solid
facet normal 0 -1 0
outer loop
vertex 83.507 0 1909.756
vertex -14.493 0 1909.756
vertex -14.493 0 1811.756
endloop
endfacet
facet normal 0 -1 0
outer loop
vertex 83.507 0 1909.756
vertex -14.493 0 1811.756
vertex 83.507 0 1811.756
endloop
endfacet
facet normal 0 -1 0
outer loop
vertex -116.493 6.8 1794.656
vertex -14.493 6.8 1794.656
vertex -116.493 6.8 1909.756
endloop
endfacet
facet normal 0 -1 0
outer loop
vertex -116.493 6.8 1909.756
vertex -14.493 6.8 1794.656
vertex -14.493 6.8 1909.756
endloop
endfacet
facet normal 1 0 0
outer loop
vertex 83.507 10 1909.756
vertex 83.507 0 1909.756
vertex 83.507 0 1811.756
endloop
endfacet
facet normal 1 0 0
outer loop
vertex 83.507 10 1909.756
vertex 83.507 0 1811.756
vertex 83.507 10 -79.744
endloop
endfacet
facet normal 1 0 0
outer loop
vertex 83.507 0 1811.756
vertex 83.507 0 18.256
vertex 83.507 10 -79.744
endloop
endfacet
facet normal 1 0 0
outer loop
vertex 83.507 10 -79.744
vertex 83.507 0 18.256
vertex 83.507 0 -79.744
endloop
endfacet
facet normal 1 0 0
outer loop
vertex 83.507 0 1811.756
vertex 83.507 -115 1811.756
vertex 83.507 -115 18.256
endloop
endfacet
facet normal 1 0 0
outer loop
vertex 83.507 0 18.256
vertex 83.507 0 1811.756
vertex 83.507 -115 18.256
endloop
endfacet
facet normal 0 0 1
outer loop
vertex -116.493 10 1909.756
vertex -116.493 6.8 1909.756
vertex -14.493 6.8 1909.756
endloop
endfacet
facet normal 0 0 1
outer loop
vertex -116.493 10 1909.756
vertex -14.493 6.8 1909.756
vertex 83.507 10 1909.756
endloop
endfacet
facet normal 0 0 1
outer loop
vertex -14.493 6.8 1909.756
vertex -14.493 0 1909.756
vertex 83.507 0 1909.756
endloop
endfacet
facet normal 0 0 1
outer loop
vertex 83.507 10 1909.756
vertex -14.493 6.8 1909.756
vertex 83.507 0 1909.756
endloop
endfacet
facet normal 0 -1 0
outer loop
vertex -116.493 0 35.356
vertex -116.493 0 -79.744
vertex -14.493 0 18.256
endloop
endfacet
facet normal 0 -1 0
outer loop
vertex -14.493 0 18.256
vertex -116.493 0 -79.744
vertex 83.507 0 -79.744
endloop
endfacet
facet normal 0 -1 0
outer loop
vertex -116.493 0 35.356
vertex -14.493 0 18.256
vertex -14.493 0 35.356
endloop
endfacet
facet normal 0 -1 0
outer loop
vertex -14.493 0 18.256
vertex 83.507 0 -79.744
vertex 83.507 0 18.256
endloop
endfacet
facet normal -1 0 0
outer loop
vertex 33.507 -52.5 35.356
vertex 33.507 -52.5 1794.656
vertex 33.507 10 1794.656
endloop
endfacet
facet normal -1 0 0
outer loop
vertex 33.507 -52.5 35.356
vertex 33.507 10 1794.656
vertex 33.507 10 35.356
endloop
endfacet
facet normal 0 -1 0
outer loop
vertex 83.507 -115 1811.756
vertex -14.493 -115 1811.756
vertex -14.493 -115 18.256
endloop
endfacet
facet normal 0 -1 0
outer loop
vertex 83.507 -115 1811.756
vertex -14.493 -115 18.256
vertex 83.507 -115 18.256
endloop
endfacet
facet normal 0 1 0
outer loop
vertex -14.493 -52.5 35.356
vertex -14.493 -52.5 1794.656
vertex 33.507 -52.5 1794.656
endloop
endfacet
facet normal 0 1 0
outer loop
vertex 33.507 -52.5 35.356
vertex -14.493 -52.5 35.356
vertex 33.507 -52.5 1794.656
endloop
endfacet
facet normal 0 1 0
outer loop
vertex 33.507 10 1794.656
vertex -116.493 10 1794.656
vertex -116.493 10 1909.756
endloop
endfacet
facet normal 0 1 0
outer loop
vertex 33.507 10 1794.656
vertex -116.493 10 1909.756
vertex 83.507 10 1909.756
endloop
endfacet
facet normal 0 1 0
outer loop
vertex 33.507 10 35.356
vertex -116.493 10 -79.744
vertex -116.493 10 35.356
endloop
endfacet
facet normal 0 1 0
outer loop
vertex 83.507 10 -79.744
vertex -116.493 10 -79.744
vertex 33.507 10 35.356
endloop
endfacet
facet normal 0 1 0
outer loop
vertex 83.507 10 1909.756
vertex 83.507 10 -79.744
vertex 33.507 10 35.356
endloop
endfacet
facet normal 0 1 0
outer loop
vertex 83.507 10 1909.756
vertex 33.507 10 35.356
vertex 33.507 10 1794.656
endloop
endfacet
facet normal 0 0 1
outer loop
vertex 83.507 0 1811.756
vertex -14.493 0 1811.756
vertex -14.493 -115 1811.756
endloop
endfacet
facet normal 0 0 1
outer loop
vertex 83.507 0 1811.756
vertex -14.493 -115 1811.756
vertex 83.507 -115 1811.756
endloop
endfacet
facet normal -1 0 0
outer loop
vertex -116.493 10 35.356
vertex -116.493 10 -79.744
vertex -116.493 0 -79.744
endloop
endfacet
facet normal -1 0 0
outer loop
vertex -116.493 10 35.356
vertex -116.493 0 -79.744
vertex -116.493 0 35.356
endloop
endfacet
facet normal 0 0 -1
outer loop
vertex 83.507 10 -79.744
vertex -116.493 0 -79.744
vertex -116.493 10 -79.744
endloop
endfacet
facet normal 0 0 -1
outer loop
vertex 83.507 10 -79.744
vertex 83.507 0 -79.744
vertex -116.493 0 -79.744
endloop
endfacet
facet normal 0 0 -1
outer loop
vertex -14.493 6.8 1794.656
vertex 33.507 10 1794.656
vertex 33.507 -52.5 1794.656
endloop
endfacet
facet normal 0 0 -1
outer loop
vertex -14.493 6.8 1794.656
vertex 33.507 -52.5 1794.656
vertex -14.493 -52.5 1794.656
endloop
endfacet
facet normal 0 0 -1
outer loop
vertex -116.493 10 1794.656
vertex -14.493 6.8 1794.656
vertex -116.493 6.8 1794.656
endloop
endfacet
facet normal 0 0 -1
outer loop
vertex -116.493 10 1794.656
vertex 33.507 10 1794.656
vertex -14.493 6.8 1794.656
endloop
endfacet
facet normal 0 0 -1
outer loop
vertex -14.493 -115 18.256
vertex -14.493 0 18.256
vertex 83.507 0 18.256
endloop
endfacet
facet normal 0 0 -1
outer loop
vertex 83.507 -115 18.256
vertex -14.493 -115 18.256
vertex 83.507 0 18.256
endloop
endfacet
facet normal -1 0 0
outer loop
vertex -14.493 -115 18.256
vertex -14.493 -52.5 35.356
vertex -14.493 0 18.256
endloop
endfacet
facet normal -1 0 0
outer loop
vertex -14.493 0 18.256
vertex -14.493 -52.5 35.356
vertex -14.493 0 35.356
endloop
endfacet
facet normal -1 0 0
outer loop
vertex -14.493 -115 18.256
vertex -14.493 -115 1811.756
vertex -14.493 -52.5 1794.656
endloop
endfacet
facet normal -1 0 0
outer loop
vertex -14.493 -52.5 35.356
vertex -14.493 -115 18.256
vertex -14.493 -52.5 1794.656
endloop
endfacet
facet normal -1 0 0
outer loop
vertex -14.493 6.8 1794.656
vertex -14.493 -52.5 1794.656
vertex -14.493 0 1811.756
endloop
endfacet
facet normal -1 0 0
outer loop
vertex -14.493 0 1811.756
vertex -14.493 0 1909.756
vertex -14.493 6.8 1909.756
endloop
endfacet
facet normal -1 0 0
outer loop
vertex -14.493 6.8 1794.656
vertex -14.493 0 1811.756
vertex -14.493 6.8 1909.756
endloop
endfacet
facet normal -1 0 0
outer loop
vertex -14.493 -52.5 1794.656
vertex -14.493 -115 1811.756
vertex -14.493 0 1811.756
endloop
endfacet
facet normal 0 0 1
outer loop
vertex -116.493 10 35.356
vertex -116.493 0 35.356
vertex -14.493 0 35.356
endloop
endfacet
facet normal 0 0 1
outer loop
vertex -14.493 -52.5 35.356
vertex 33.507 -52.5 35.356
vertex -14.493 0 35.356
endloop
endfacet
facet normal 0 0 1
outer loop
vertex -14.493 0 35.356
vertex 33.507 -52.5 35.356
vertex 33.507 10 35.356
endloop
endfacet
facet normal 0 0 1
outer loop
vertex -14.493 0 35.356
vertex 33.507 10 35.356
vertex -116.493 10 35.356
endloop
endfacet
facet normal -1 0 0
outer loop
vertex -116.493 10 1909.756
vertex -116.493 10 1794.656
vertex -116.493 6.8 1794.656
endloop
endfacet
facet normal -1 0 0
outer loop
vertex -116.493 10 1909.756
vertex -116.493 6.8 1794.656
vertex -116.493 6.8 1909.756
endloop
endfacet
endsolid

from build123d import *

# Parameters (mm, degrees)
SKETCH_2_W      = 98
SKETCH_2_H      = 98
EXTRUDE_1_DEPTH = 10
SKETCH_3_W      = 98
SKETCH_3_H      = 125
EXTRUDE_2_DEPTH = 10
SKETCH_4_W      = 98
SKETCH_4_H      = 62.5
EXTRUDE_3_DEPTH = 886.75
SKETCH_5_W      = 98
SKETCH_5_H      = 62.5
EXTRUDE_4_DEPTH = 7.1
SKETCH_6_W      = 98
SKETCH_6_H      = 62.5
EXTRUDE_5_DEPTH = 7.1
SKETCH_9_W      = 115.1
SKETCH_9_H      = 10
SKETCH_9_H_2    = 3.2
EXTRUDE_6_DEPTH = 102
SKETCH_11_W     = 50
SKETCH_11_H     = 1759.3
EXTRUDE_7_DEPTH = 62.5


with BuildPart() as part:
    # 草图2 → 凸台-拉伸1 (new body)
    with BuildSketch(Plane(origin=(0, 0, 0), x_dir=(1, 0, 0), z_dir=(0, 1, 0))):
        with Locations((34.507061985, 30.744472309)):
            Rectangle(SKETCH_2_W, SKETCH_2_H)
    extrude(amount=EXTRUDE_1_DEPTH)

    # 草图3 → 凸台-拉伸2 (add)
    with BuildSketch(Plane.XY.offset(18.255527691)):
        with Locations((34.507061985, -52.5)):
            Rectangle(SKETCH_3_W, SKETCH_3_H)
    extrude(amount=EXTRUDE_2_DEPTH)

    # 草图4 → 凸台-拉伸3 (add)
    with BuildSketch(Plane.XY.offset(28.255527691)):
        with Locations((34.507061985, -83.75)):
            Rectangle(SKETCH_4_W, SKETCH_4_H)
    extrude(amount=EXTRUDE_3_DEPTH)

    # 镜向4: part across plane


with BuildPart() as part_1:
    add(part.part)
    add(part.part.mirror(Plane.XY.offset(915.005527691)))

    # 草图5 → 凸台-拉伸4 (add)
    with BuildSketch(Plane.XY.offset(28.255527691)):
        with Locations((34.507061985, -21.25)):
            Rectangle(SKETCH_5_W, SKETCH_5_H)
    extrude(amount=EXTRUDE_4_DEPTH)

    # 草图6 → 凸台-拉伸5 (add)
    with BuildSketch(Plane(origin=(0, 0, 1801.755527691), x_dir=(-1, 0, 0), z_dir=(0, 0, -1))):
        with Locations((-34.507061985, -21.25)):
            Rectangle(SKETCH_6_W, SKETCH_6_H)
    extrude(amount=EXTRUDE_5_DEPTH)

    # 草图9 → 凸台-拉伸6 (add)
    with BuildSketch(Plane.ZY.offset(14.492938015)):
        with Locations((-22.194472309, 5)):
            Rectangle(SKETCH_9_W, SKETCH_9_H)
        with Locations((1852.205527691, 8.4)):
            Rectangle(SKETCH_9_W, SKETCH_9_H_2)
    extrude(amount=EXTRUDE_6_DEPTH)

    # 草图11 → 凸台-拉伸7 (add)
    with BuildSketch(Plane(origin=(0, -52.5, 0), x_dir=(1, 0, 0), z_dir=(0, 1, 0))):
        with Locations((58.507061985, -915.005527691)):
            Rectangle(SKETCH_11_W, SKETCH_11_H)
    extrude(amount=EXTRUDE_7_DEPTH)


solid = part_1.part
